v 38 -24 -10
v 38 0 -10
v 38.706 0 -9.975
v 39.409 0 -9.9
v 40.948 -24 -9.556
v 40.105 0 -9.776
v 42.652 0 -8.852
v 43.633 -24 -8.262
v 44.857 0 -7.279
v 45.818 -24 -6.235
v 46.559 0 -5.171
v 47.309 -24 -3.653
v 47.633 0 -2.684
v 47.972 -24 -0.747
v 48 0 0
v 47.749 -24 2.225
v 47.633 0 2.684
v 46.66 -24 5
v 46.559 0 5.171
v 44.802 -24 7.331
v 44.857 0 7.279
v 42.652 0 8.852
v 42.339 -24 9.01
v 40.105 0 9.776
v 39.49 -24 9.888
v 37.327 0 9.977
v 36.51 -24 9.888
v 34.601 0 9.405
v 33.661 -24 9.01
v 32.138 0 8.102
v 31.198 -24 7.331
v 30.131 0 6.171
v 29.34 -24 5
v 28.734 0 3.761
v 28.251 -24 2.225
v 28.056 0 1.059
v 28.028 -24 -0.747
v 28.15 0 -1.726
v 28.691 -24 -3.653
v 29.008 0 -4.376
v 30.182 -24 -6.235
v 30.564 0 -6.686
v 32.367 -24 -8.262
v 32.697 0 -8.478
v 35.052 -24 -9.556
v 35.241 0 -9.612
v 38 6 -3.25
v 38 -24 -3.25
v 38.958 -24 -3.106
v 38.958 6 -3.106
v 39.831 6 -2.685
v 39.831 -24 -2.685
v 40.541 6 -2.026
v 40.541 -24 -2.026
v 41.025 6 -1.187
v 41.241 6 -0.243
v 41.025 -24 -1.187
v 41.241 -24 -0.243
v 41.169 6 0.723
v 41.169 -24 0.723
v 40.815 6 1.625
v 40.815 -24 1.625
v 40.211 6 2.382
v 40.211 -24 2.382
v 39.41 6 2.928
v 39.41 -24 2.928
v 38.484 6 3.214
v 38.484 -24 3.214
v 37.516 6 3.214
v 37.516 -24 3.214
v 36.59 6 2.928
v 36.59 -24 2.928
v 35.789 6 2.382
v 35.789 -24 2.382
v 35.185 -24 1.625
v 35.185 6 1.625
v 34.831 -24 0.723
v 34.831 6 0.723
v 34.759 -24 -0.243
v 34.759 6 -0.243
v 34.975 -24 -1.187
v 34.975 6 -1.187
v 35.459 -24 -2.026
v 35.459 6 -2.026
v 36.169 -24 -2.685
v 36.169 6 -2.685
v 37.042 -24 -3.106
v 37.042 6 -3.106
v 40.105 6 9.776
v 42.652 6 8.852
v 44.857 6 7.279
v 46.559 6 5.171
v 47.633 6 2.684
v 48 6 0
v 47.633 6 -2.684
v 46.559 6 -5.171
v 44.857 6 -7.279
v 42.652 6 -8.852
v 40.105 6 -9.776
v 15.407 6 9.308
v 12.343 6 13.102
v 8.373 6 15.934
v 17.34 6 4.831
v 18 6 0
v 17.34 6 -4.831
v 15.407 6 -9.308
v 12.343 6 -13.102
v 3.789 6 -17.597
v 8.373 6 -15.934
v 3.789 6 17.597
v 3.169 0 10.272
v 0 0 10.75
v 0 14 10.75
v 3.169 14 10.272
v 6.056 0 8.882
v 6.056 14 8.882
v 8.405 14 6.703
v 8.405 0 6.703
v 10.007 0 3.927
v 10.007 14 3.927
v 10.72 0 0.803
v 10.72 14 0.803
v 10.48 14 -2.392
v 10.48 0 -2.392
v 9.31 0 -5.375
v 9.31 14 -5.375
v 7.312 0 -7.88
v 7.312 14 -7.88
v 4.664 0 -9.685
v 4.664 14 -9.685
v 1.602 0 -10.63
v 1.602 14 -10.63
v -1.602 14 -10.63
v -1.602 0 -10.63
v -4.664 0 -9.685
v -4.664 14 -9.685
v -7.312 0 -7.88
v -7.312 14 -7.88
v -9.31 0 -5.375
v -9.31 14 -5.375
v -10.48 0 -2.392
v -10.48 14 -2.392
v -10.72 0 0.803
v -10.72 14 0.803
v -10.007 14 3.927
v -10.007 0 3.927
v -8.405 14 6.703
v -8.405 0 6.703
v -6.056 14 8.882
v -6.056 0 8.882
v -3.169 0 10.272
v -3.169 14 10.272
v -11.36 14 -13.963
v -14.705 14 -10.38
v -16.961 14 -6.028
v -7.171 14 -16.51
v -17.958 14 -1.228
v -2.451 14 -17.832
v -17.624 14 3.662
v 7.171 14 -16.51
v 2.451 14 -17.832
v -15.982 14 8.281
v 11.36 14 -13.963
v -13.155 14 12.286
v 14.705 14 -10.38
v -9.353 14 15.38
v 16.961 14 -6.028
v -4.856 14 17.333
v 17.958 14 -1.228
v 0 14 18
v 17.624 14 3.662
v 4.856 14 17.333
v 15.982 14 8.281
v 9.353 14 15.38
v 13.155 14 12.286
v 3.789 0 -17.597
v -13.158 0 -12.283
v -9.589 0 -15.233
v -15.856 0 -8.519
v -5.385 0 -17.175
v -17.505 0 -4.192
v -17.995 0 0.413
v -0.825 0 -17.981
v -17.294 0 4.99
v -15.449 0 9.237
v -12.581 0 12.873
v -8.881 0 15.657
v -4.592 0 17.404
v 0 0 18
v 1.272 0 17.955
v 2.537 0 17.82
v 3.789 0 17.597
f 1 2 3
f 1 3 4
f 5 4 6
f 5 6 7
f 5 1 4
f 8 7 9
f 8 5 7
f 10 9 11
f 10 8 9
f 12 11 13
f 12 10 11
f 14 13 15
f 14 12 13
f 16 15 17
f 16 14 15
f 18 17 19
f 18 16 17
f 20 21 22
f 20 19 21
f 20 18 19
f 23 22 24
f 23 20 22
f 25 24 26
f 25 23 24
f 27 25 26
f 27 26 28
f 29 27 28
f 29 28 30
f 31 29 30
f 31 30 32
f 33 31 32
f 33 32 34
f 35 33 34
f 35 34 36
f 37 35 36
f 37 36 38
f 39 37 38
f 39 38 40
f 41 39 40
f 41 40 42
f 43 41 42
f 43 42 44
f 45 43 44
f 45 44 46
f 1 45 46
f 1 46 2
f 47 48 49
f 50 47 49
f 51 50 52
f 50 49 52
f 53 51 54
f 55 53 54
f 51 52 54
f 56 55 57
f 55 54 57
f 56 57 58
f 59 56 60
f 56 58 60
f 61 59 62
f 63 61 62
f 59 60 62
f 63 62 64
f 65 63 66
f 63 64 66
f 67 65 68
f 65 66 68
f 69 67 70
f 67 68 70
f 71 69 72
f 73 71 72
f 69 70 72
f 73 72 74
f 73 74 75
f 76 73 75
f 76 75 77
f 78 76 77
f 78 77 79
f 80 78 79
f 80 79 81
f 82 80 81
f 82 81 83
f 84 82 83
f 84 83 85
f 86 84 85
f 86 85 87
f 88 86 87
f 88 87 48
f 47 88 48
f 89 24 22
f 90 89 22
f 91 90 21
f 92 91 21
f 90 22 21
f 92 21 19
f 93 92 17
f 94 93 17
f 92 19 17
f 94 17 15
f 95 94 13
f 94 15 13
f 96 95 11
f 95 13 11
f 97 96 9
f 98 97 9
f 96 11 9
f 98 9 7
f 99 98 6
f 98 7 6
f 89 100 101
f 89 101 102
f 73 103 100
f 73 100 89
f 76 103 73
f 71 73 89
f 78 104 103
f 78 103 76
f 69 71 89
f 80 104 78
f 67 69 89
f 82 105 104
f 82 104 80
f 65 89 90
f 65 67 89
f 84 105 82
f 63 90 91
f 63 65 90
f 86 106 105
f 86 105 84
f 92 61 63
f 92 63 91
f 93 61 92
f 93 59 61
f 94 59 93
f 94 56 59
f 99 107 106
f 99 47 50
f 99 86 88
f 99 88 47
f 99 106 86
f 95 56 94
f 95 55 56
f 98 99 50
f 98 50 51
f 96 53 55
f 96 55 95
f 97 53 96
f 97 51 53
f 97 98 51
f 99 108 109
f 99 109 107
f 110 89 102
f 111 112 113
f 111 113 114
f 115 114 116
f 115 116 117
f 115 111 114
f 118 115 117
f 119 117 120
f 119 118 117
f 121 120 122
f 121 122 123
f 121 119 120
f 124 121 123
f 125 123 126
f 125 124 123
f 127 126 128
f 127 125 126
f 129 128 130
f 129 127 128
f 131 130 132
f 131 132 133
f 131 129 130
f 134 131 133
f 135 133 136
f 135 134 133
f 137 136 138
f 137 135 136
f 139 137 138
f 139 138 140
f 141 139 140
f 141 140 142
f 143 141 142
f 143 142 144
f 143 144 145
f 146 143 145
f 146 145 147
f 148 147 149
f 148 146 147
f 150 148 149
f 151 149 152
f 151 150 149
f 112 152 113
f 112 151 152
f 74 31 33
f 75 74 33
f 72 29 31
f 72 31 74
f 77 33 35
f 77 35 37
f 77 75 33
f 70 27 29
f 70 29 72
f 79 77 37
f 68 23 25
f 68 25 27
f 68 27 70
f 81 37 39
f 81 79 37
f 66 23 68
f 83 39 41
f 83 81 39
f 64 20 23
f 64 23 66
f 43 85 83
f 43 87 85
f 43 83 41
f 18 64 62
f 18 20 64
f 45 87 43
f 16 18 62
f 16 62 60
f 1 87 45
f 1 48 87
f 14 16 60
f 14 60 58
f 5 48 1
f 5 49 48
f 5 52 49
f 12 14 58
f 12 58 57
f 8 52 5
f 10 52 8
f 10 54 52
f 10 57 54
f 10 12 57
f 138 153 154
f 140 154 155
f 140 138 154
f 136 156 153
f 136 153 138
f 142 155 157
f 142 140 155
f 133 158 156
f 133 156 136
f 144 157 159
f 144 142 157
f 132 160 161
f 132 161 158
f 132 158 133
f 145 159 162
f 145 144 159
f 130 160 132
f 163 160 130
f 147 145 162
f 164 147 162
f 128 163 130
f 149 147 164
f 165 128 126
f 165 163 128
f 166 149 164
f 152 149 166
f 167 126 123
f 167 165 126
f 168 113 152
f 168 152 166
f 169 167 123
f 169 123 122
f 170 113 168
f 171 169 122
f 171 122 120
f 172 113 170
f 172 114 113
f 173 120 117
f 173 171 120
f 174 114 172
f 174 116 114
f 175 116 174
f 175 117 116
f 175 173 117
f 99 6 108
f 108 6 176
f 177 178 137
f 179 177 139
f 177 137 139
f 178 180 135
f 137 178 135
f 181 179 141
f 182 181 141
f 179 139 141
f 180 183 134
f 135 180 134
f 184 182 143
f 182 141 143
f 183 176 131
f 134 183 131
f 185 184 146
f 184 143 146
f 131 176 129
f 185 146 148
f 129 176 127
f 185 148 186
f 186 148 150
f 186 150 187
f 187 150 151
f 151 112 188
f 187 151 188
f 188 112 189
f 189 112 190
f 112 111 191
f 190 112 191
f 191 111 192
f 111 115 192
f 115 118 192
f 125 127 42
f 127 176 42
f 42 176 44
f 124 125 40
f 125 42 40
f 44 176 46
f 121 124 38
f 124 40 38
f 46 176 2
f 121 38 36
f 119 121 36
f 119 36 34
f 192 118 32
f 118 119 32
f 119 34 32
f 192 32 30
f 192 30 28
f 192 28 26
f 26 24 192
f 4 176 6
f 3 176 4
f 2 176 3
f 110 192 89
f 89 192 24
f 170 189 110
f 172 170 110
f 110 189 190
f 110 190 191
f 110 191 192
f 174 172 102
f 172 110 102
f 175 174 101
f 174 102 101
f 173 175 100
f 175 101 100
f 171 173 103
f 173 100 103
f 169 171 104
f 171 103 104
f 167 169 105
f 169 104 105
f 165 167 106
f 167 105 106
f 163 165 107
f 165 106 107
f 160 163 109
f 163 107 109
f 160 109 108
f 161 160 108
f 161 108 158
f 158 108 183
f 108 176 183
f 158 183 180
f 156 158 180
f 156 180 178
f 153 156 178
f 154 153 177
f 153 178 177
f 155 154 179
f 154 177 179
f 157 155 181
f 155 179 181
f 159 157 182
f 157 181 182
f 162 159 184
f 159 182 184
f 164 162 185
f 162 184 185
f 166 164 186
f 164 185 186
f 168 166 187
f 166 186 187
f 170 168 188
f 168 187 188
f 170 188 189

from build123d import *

# Parameters (mm, degrees)
SKETCH1_R           = 10.75
BOSS_EXTRUDE1_DEPTH = 14
BOSS_EXTRUDE2_DEPTH = 6
BOSS_EXTRUDE3_START = 24
SKETCH6_R           = 10
BOSS_EXTRUDE3_DEPTH = 24
SKETCH7_R           = 3.25
CUT_EXTRUDE1_DEPTH  = 64.812224534


with BuildPart() as part:
    # Sketch1 → Boss-Extrude1 (new body)
    with BuildSketch(Plane(origin=(0, 0, 0), x_dir=(1, 0, 0), z_dir=(0, 1, 0))):
        with BuildLine():
            ThreePointArc((18, 0), (14.003758894, 11.309055524), (3.789473684, 17.59658743))
            ThreePointArc((3.789473684, 17.59658743), (-18, 0), (3.789473684, -17.59658743))
            ThreePointArc((3.789473684, -17.59658743), (14.003758894, -11.309055524), (18, 0))
        make_face()
        Circle(SKETCH1_R, mode=Mode.SUBTRACT)
    extrude(amount=BOSS_EXTRUDE1_DEPTH)

    # Sketch1<4> → Boss-Extrude2 (add)
    with BuildSketch(Plane(origin=(0, 0, 0), x_dir=(1, 0, 0), z_dir=(0, 1, 0))):
        with BuildLine():
            ThreePointArc((40.105263158, -9.775881906), (48, 0), (40.105263158, 9.775881906))
            Line((40.105263158, 9.775881906), (3.789473684, 17.59658743))
            ThreePointArc((3.789473684, 17.59658743), (14.003758894, 11.309055524), (18, 0))
            ThreePointArc((18, 0), (14.003758894, -11.309055524), (3.789473684, -17.59658743))
            Line((3.789473684, -17.59658743), (40.105263158, -9.775881906))
        make_face()
    extrude(amount=BOSS_EXTRUDE2_DEPTH)

    # Sketch6 → Boss-Extrude3 (add)
    with BuildSketch(Plane.XZ.offset(BOSS_EXTRUDE3_START)):
        with Locations((38, 0)):
            Circle(SKETCH6_R)
    extrude(amount=-BOSS_EXTRUDE3_DEPTH)

    # Sketch7 → Cut-Extrude1 (cut, through all)
    with BuildSketch(Plane.XZ.offset(24)):
        with Locations((38, 0)):
            Circle(SKETCH7_R)
    extrude(amount=-CUT_EXTRUDE1_DEPTH, mode=Mode.SUBTRACT)


solid = part.part
